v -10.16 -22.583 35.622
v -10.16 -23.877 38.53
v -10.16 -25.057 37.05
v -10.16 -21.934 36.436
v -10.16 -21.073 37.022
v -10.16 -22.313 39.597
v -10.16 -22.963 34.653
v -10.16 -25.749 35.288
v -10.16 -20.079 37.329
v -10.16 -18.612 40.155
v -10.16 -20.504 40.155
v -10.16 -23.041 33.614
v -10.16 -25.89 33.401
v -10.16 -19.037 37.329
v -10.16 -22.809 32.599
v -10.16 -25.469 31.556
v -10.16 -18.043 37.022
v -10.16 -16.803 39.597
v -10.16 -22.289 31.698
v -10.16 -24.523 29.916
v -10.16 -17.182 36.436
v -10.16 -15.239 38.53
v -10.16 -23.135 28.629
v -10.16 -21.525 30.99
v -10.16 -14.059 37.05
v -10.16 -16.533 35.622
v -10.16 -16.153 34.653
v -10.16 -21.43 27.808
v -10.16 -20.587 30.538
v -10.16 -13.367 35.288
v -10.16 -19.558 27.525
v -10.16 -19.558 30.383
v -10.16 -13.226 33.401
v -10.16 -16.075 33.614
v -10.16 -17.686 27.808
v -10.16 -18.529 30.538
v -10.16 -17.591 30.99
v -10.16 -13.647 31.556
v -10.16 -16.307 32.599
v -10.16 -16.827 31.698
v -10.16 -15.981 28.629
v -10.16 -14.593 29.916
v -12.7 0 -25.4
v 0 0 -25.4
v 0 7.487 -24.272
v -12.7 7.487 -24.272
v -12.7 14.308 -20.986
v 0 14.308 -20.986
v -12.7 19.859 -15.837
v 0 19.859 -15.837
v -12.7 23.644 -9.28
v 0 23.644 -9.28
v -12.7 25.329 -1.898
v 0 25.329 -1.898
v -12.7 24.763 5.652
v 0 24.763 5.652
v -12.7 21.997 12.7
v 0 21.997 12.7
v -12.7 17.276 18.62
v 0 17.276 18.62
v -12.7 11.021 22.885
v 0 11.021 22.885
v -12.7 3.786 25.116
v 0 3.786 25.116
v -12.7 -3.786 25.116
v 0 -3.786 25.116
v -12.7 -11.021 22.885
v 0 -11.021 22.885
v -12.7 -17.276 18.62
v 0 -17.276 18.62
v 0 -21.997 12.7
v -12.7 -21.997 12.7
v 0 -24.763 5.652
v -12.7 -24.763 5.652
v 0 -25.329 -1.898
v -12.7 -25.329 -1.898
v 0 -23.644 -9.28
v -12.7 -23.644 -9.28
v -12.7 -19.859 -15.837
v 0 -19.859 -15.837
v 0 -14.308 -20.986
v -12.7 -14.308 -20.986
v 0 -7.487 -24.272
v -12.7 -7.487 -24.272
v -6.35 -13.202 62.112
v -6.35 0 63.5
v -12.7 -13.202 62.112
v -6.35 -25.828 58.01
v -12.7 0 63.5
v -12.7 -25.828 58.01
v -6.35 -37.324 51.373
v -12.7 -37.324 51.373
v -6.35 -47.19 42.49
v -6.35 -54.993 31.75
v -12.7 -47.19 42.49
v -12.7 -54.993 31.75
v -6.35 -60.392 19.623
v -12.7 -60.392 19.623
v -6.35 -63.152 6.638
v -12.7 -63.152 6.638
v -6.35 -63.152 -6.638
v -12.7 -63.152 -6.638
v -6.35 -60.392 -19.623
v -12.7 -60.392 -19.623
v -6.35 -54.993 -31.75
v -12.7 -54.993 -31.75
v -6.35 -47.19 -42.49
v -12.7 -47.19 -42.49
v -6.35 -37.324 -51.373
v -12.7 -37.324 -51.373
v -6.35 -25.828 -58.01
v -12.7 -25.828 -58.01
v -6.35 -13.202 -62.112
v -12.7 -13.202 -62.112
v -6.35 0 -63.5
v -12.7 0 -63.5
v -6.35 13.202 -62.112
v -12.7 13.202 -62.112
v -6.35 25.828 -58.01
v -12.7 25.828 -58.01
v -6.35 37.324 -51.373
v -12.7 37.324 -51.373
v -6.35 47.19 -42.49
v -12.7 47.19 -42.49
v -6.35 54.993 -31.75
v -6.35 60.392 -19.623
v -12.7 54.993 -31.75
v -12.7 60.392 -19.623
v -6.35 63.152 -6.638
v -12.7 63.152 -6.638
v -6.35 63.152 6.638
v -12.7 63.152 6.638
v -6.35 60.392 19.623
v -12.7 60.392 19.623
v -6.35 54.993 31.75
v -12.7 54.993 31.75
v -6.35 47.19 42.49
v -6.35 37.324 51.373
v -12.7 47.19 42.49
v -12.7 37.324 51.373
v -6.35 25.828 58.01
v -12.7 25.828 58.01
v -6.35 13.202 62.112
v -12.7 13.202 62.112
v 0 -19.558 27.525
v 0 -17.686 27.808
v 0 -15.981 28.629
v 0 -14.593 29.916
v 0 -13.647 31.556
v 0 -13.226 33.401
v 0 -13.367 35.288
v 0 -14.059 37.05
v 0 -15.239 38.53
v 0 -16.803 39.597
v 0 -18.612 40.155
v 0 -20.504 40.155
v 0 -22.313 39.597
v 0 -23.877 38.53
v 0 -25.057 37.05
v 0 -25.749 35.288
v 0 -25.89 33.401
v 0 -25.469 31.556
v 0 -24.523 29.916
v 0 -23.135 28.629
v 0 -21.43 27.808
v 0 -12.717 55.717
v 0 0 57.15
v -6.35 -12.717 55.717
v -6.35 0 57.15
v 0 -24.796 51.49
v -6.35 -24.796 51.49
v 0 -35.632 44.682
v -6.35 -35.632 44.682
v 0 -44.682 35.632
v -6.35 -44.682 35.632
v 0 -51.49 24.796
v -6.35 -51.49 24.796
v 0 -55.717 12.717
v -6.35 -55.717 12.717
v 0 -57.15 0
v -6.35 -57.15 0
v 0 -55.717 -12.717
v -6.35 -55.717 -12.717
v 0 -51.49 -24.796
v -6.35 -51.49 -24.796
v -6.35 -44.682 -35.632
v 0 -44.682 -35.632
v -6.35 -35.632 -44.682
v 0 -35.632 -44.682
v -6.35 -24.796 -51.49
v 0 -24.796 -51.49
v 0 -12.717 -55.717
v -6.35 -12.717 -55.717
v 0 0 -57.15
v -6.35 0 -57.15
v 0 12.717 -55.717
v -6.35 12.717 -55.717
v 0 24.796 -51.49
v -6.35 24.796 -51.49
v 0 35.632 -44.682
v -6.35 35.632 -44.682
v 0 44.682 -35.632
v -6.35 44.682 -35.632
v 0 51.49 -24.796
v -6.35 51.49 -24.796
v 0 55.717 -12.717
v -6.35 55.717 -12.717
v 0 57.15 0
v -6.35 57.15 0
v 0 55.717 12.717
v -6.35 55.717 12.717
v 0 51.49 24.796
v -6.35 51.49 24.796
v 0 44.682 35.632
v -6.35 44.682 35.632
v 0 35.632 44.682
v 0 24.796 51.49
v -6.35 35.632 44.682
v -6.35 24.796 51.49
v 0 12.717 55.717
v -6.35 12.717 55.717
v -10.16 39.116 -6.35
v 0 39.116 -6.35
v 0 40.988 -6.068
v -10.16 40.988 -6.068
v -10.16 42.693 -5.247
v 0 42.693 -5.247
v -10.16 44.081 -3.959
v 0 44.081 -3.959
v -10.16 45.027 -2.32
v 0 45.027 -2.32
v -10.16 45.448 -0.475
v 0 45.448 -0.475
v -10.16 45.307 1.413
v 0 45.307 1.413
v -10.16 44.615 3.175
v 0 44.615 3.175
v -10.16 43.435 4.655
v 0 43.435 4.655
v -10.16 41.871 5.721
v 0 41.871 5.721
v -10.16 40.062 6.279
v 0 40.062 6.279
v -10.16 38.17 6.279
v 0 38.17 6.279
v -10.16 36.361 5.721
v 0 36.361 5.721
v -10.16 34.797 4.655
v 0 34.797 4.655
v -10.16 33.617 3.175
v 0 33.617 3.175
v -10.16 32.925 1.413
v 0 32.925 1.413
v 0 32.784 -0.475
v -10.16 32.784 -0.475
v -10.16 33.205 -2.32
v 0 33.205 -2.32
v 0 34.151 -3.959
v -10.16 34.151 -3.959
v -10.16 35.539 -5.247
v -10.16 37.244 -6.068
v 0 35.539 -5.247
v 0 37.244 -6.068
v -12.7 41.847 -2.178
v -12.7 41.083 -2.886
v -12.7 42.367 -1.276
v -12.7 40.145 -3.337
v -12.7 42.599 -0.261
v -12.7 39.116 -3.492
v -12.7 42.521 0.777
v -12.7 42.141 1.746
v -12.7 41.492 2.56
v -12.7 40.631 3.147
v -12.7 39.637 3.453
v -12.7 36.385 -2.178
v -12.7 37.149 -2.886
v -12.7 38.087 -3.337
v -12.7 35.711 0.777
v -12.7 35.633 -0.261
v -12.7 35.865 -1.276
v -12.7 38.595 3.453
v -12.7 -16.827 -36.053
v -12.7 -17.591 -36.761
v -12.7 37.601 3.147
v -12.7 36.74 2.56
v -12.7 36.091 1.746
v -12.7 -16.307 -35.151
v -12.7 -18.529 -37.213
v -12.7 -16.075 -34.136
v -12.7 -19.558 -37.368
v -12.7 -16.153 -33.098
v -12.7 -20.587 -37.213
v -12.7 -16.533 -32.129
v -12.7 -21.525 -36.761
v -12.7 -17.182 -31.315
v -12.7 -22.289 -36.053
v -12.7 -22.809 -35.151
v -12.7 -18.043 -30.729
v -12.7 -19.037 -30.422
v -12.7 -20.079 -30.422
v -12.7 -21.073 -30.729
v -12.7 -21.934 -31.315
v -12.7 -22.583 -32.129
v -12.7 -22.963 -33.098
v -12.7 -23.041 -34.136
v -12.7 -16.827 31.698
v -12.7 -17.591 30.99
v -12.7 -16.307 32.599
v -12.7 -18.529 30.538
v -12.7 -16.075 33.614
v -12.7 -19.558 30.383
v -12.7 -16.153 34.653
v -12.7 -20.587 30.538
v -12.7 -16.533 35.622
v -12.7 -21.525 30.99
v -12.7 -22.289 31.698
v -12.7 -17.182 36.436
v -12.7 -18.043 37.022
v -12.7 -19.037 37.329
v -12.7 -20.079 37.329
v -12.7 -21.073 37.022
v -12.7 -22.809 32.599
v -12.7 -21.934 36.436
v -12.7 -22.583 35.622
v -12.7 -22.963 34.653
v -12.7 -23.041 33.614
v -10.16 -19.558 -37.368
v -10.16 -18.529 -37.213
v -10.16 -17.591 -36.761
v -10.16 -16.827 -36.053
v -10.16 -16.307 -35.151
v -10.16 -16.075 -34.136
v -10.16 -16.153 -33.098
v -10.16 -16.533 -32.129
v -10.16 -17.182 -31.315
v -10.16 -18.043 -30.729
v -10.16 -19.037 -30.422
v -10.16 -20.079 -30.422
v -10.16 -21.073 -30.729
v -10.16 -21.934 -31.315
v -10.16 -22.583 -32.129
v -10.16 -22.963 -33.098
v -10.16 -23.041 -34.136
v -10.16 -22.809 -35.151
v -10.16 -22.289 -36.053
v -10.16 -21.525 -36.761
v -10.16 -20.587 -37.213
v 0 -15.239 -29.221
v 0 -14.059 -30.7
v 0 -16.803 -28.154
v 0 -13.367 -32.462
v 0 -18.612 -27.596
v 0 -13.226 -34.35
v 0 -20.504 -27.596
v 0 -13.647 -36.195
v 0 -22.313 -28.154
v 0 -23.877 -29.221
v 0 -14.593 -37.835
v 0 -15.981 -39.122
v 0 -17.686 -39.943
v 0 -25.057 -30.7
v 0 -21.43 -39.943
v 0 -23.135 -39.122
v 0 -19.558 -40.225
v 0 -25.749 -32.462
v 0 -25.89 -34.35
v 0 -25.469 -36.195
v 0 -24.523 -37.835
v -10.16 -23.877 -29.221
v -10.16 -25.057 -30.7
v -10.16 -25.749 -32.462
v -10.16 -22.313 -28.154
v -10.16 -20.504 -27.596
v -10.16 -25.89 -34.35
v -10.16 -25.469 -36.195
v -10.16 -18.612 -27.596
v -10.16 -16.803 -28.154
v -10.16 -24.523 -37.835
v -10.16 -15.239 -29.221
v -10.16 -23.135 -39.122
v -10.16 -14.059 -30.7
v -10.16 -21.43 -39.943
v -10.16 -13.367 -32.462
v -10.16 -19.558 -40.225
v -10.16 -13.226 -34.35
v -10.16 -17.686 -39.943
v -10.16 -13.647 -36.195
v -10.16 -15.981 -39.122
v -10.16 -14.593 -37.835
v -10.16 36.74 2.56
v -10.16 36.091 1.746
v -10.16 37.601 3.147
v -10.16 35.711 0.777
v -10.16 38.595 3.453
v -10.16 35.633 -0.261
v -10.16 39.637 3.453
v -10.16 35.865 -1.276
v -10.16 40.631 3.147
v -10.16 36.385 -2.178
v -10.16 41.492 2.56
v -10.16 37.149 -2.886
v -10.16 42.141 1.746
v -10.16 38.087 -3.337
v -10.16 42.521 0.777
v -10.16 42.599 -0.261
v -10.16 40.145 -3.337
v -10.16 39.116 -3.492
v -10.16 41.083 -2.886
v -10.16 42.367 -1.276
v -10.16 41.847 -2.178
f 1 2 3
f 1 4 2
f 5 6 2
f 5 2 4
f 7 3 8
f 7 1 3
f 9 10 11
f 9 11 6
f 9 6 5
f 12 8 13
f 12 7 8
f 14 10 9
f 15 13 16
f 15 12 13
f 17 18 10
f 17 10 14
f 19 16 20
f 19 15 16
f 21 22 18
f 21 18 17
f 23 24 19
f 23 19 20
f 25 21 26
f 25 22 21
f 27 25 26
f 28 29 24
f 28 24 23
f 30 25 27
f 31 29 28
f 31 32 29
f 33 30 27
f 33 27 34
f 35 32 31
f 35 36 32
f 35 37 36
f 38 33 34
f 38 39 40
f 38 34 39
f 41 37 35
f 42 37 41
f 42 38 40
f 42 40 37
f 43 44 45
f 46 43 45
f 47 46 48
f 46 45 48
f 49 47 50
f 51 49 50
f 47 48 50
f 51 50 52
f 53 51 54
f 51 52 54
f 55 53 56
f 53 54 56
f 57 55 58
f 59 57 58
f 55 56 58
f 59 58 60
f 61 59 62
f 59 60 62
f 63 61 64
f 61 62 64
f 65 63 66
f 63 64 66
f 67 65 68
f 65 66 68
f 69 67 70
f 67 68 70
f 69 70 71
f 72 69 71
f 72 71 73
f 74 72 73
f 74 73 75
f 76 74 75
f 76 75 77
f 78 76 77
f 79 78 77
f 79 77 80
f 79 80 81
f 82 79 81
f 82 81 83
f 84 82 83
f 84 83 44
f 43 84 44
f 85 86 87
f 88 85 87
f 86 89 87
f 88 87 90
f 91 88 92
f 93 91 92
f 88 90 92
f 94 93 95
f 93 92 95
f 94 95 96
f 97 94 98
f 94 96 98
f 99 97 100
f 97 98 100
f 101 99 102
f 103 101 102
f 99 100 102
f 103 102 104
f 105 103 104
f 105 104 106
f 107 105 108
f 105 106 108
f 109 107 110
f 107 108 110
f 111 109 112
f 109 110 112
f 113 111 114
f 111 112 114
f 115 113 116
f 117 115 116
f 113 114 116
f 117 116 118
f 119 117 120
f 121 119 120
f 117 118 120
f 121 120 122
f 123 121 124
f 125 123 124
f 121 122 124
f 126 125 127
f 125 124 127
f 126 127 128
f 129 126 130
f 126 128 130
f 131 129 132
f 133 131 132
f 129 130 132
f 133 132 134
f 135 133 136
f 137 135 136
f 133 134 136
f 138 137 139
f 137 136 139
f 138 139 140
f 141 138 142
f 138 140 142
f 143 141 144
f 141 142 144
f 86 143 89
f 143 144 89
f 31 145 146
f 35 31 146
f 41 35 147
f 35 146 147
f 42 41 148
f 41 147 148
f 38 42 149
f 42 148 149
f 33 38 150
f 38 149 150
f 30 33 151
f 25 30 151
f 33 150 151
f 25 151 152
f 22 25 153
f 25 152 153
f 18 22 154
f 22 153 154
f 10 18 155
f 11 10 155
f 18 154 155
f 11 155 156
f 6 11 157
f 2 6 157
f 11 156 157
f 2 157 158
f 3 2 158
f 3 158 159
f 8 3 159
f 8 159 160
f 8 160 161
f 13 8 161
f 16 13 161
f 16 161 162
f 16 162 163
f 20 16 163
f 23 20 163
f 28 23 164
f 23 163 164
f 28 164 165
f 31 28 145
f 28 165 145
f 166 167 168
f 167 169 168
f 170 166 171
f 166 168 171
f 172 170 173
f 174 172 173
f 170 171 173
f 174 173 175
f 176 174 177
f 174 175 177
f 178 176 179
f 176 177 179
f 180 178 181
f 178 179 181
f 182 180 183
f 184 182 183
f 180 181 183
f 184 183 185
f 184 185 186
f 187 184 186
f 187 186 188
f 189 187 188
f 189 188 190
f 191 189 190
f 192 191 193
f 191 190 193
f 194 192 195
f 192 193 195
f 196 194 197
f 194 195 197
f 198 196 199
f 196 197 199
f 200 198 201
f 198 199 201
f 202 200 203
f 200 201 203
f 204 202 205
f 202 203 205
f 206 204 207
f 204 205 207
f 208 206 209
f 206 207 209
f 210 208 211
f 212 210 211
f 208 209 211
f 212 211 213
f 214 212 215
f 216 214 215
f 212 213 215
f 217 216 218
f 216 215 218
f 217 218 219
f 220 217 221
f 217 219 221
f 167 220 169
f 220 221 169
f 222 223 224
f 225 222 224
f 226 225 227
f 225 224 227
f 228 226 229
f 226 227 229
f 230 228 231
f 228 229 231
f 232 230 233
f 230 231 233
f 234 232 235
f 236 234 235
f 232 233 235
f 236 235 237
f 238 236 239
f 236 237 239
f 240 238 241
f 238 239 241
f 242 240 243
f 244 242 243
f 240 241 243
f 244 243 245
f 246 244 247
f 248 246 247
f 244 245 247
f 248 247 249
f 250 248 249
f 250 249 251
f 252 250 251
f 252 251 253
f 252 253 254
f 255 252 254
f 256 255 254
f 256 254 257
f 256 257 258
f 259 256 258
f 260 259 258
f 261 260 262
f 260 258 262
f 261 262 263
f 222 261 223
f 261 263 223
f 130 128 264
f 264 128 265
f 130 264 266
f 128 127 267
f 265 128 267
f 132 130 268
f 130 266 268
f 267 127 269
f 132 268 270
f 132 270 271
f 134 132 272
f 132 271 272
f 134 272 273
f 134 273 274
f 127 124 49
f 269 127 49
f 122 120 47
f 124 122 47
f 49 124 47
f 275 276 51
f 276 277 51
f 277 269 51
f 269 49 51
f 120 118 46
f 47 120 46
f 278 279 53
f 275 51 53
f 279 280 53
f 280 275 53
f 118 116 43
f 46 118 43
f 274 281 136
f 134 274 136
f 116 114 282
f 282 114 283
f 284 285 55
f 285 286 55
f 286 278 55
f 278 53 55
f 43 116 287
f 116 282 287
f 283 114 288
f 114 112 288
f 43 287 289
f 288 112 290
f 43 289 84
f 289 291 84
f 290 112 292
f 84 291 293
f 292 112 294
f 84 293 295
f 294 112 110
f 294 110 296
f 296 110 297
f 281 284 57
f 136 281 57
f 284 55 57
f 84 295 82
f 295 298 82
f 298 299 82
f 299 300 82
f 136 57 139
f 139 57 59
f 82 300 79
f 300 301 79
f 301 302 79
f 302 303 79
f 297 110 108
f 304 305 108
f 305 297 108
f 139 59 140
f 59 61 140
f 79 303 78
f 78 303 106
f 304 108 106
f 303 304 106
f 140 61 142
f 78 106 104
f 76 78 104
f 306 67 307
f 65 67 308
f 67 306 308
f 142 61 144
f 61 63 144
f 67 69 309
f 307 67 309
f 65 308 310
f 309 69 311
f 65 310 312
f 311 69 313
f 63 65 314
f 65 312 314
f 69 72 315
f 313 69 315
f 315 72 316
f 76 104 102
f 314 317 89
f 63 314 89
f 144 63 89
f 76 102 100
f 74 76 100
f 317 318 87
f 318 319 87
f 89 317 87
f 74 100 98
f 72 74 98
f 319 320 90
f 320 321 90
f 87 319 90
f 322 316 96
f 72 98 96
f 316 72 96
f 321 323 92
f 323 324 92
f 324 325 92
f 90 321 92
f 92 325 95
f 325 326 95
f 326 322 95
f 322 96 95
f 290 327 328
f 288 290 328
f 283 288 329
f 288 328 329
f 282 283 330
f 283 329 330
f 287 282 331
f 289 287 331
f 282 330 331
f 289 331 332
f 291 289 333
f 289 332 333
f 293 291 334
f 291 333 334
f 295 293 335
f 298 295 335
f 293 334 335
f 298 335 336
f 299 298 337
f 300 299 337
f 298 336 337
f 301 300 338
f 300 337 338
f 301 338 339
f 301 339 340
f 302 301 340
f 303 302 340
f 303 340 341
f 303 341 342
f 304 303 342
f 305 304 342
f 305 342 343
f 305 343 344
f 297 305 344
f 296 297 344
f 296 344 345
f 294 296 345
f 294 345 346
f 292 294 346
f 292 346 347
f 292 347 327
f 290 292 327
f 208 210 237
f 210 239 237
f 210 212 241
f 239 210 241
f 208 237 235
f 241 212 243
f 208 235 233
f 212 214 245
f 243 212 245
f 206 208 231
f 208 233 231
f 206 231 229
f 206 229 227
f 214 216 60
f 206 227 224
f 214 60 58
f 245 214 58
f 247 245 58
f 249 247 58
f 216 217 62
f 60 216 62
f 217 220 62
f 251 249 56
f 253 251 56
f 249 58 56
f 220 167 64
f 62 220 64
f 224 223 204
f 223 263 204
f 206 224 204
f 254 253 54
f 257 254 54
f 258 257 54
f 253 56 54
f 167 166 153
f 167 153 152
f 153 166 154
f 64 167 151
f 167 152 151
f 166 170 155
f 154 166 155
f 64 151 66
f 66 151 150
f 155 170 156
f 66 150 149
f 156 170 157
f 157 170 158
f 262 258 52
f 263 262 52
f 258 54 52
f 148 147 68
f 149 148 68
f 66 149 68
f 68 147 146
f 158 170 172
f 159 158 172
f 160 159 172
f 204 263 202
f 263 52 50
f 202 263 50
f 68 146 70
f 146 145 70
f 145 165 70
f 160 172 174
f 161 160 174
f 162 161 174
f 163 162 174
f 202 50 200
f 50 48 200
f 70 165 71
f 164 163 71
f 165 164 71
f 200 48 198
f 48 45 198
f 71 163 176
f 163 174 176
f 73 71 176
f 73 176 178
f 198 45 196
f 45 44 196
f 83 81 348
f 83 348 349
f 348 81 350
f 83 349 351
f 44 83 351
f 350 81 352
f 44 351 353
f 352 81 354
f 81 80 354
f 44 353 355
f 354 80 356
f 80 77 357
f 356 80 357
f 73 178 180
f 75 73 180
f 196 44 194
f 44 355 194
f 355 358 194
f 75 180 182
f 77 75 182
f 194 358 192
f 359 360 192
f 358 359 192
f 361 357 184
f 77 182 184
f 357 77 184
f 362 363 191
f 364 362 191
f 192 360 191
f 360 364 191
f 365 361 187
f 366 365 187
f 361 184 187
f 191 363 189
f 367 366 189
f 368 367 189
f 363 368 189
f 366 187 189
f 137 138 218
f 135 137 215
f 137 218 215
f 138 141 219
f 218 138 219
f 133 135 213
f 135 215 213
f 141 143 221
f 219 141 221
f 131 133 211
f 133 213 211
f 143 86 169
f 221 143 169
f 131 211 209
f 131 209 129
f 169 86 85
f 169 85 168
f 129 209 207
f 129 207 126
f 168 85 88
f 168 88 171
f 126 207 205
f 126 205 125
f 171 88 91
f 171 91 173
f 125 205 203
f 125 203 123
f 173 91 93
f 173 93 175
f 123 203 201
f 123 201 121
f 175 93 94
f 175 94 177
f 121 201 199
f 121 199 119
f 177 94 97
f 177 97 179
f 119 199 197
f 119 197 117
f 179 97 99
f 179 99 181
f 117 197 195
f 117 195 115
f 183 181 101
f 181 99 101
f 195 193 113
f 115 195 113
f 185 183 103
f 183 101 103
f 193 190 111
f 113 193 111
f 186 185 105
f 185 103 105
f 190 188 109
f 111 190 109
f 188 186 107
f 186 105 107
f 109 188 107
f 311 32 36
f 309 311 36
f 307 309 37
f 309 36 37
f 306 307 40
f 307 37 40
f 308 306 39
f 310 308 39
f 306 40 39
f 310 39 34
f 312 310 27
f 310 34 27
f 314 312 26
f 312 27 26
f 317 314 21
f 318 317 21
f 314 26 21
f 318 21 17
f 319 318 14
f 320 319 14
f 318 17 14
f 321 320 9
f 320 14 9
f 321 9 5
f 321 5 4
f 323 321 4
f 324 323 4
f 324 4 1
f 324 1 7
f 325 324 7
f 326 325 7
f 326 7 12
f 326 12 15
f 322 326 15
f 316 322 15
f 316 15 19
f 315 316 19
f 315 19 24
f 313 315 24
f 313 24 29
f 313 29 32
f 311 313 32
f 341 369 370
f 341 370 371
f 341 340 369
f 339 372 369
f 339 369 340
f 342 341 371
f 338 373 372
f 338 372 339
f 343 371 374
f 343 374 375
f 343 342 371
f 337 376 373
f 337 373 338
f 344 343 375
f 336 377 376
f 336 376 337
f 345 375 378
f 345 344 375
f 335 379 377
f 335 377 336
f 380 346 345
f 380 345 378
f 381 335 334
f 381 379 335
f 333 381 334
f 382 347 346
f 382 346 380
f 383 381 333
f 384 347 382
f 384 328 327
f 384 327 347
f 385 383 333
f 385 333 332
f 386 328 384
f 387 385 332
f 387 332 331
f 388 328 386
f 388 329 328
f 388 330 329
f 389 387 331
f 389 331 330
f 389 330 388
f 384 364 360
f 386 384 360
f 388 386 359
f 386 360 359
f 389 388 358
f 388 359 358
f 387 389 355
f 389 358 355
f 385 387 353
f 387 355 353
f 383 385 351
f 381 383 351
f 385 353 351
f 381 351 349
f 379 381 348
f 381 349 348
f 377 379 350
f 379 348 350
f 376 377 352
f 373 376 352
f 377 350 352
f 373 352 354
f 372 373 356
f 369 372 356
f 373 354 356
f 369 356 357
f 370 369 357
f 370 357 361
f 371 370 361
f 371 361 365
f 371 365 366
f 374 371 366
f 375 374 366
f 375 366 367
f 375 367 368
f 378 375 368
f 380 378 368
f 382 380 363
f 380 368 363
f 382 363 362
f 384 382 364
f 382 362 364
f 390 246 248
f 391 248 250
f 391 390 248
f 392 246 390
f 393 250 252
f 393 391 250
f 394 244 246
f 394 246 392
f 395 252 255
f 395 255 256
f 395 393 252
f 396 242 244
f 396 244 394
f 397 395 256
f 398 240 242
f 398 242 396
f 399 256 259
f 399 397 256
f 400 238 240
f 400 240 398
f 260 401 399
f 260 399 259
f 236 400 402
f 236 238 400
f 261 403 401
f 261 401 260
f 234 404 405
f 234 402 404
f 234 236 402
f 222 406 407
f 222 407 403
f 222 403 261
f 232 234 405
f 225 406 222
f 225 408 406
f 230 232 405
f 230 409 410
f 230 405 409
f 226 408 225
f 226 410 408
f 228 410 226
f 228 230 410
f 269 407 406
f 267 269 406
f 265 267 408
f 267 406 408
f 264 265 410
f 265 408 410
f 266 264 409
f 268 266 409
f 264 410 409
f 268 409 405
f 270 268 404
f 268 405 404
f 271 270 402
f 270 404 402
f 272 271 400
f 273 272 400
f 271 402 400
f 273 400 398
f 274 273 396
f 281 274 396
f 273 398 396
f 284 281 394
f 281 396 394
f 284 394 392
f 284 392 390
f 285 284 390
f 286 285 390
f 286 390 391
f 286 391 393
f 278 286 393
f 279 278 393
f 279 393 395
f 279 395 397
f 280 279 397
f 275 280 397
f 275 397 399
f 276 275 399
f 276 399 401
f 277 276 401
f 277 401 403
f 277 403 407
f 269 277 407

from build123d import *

# Parameters (mm, degrees)
SKETCH4_R          = 3.4925
SKETCH4_R_2        = 25.4
CUT_EXTRUDE1_DEPTH = 91.696141042
SKETCH4_3_R        = 6.35
SKETCH4_3_R_2      = 3.4925
CUT_EXTRUDE2_DEPTH = 10.16


with BuildPart() as part:
    # Sketch1 → Revolve1 (revolve)
    with BuildSketch(Plane.XY):
        Polygon((0, 0), (0, 57.15), (-6.35, 57.15), (-6.35, 63.5), (-12.7, 63.5), (-12.7, 0), align=None)
    revolve(axis=Axis((0, 0, 0), (1, 0, 0)))

    # Sketch4 → Cut-Extrude1 (cut, through all)
    with BuildSketch(Plane(origin=(0, 0, 0), x_dir=(0, 0, -1), z_dir=(1, 0, 0))):
        with Locations((0, 39.116)):
            Circle(SKETCH4_R)
        with Locations((33.875449694, -19.558)):
            Circle(SKETCH4_R)
        with Locations((-33.875449694, -19.558)):
            Circle(SKETCH4_R)
        Circle(SKETCH4_R_2)
    extrude(amount=-CUT_EXTRUDE1_DEPTH, mode=Mode.SUBTRACT)

    # Sketch4<3> → Cut-Extrude2 (cut)
    # profile 1 of 3: a face of its own
    with BuildSketch(Plane(origin=(0, 0, 0), x_dir=(0, 0, -1), z_dir=(1, 0, 0))):
        with Locations((0, 39.116)):
            Circle(SKETCH4_3_R)
        with Locations((0, 39.116)):
            Circle(SKETCH4_3_R_2, mode=Mode.SUBTRACT)
    # profile 2 of 3: a face of its own
    with BuildSketch(Plane(origin=(0, 0, 0), x_dir=(0, 0, -1), z_dir=(1, 0, 0))):
        with Locations((33.875449694, -19.558)):
            Circle(SKETCH4_3_R)
        with Locations((33.875449694, -19.558)):
            Circle(SKETCH4_3_R_2, mode=Mode.SUBTRACT)
    # profile 3 of 3: a face of its own
    with BuildSketch(Plane(origin=(0, 0, 0), x_dir=(0, 0, -1), z_dir=(1, 0, 0))):
        with Locations((-33.875449694, -19.558)):
            Circle(SKETCH4_3_R)
        with Locations((-33.875449694, -19.558)):
            Circle(SKETCH4_3_R_2, mode=Mode.SUBTRACT)
    extrude(amount=-CUT_EXTRUDE2_DEPTH, mode=Mode.SUBTRACT)


solid = part.part
